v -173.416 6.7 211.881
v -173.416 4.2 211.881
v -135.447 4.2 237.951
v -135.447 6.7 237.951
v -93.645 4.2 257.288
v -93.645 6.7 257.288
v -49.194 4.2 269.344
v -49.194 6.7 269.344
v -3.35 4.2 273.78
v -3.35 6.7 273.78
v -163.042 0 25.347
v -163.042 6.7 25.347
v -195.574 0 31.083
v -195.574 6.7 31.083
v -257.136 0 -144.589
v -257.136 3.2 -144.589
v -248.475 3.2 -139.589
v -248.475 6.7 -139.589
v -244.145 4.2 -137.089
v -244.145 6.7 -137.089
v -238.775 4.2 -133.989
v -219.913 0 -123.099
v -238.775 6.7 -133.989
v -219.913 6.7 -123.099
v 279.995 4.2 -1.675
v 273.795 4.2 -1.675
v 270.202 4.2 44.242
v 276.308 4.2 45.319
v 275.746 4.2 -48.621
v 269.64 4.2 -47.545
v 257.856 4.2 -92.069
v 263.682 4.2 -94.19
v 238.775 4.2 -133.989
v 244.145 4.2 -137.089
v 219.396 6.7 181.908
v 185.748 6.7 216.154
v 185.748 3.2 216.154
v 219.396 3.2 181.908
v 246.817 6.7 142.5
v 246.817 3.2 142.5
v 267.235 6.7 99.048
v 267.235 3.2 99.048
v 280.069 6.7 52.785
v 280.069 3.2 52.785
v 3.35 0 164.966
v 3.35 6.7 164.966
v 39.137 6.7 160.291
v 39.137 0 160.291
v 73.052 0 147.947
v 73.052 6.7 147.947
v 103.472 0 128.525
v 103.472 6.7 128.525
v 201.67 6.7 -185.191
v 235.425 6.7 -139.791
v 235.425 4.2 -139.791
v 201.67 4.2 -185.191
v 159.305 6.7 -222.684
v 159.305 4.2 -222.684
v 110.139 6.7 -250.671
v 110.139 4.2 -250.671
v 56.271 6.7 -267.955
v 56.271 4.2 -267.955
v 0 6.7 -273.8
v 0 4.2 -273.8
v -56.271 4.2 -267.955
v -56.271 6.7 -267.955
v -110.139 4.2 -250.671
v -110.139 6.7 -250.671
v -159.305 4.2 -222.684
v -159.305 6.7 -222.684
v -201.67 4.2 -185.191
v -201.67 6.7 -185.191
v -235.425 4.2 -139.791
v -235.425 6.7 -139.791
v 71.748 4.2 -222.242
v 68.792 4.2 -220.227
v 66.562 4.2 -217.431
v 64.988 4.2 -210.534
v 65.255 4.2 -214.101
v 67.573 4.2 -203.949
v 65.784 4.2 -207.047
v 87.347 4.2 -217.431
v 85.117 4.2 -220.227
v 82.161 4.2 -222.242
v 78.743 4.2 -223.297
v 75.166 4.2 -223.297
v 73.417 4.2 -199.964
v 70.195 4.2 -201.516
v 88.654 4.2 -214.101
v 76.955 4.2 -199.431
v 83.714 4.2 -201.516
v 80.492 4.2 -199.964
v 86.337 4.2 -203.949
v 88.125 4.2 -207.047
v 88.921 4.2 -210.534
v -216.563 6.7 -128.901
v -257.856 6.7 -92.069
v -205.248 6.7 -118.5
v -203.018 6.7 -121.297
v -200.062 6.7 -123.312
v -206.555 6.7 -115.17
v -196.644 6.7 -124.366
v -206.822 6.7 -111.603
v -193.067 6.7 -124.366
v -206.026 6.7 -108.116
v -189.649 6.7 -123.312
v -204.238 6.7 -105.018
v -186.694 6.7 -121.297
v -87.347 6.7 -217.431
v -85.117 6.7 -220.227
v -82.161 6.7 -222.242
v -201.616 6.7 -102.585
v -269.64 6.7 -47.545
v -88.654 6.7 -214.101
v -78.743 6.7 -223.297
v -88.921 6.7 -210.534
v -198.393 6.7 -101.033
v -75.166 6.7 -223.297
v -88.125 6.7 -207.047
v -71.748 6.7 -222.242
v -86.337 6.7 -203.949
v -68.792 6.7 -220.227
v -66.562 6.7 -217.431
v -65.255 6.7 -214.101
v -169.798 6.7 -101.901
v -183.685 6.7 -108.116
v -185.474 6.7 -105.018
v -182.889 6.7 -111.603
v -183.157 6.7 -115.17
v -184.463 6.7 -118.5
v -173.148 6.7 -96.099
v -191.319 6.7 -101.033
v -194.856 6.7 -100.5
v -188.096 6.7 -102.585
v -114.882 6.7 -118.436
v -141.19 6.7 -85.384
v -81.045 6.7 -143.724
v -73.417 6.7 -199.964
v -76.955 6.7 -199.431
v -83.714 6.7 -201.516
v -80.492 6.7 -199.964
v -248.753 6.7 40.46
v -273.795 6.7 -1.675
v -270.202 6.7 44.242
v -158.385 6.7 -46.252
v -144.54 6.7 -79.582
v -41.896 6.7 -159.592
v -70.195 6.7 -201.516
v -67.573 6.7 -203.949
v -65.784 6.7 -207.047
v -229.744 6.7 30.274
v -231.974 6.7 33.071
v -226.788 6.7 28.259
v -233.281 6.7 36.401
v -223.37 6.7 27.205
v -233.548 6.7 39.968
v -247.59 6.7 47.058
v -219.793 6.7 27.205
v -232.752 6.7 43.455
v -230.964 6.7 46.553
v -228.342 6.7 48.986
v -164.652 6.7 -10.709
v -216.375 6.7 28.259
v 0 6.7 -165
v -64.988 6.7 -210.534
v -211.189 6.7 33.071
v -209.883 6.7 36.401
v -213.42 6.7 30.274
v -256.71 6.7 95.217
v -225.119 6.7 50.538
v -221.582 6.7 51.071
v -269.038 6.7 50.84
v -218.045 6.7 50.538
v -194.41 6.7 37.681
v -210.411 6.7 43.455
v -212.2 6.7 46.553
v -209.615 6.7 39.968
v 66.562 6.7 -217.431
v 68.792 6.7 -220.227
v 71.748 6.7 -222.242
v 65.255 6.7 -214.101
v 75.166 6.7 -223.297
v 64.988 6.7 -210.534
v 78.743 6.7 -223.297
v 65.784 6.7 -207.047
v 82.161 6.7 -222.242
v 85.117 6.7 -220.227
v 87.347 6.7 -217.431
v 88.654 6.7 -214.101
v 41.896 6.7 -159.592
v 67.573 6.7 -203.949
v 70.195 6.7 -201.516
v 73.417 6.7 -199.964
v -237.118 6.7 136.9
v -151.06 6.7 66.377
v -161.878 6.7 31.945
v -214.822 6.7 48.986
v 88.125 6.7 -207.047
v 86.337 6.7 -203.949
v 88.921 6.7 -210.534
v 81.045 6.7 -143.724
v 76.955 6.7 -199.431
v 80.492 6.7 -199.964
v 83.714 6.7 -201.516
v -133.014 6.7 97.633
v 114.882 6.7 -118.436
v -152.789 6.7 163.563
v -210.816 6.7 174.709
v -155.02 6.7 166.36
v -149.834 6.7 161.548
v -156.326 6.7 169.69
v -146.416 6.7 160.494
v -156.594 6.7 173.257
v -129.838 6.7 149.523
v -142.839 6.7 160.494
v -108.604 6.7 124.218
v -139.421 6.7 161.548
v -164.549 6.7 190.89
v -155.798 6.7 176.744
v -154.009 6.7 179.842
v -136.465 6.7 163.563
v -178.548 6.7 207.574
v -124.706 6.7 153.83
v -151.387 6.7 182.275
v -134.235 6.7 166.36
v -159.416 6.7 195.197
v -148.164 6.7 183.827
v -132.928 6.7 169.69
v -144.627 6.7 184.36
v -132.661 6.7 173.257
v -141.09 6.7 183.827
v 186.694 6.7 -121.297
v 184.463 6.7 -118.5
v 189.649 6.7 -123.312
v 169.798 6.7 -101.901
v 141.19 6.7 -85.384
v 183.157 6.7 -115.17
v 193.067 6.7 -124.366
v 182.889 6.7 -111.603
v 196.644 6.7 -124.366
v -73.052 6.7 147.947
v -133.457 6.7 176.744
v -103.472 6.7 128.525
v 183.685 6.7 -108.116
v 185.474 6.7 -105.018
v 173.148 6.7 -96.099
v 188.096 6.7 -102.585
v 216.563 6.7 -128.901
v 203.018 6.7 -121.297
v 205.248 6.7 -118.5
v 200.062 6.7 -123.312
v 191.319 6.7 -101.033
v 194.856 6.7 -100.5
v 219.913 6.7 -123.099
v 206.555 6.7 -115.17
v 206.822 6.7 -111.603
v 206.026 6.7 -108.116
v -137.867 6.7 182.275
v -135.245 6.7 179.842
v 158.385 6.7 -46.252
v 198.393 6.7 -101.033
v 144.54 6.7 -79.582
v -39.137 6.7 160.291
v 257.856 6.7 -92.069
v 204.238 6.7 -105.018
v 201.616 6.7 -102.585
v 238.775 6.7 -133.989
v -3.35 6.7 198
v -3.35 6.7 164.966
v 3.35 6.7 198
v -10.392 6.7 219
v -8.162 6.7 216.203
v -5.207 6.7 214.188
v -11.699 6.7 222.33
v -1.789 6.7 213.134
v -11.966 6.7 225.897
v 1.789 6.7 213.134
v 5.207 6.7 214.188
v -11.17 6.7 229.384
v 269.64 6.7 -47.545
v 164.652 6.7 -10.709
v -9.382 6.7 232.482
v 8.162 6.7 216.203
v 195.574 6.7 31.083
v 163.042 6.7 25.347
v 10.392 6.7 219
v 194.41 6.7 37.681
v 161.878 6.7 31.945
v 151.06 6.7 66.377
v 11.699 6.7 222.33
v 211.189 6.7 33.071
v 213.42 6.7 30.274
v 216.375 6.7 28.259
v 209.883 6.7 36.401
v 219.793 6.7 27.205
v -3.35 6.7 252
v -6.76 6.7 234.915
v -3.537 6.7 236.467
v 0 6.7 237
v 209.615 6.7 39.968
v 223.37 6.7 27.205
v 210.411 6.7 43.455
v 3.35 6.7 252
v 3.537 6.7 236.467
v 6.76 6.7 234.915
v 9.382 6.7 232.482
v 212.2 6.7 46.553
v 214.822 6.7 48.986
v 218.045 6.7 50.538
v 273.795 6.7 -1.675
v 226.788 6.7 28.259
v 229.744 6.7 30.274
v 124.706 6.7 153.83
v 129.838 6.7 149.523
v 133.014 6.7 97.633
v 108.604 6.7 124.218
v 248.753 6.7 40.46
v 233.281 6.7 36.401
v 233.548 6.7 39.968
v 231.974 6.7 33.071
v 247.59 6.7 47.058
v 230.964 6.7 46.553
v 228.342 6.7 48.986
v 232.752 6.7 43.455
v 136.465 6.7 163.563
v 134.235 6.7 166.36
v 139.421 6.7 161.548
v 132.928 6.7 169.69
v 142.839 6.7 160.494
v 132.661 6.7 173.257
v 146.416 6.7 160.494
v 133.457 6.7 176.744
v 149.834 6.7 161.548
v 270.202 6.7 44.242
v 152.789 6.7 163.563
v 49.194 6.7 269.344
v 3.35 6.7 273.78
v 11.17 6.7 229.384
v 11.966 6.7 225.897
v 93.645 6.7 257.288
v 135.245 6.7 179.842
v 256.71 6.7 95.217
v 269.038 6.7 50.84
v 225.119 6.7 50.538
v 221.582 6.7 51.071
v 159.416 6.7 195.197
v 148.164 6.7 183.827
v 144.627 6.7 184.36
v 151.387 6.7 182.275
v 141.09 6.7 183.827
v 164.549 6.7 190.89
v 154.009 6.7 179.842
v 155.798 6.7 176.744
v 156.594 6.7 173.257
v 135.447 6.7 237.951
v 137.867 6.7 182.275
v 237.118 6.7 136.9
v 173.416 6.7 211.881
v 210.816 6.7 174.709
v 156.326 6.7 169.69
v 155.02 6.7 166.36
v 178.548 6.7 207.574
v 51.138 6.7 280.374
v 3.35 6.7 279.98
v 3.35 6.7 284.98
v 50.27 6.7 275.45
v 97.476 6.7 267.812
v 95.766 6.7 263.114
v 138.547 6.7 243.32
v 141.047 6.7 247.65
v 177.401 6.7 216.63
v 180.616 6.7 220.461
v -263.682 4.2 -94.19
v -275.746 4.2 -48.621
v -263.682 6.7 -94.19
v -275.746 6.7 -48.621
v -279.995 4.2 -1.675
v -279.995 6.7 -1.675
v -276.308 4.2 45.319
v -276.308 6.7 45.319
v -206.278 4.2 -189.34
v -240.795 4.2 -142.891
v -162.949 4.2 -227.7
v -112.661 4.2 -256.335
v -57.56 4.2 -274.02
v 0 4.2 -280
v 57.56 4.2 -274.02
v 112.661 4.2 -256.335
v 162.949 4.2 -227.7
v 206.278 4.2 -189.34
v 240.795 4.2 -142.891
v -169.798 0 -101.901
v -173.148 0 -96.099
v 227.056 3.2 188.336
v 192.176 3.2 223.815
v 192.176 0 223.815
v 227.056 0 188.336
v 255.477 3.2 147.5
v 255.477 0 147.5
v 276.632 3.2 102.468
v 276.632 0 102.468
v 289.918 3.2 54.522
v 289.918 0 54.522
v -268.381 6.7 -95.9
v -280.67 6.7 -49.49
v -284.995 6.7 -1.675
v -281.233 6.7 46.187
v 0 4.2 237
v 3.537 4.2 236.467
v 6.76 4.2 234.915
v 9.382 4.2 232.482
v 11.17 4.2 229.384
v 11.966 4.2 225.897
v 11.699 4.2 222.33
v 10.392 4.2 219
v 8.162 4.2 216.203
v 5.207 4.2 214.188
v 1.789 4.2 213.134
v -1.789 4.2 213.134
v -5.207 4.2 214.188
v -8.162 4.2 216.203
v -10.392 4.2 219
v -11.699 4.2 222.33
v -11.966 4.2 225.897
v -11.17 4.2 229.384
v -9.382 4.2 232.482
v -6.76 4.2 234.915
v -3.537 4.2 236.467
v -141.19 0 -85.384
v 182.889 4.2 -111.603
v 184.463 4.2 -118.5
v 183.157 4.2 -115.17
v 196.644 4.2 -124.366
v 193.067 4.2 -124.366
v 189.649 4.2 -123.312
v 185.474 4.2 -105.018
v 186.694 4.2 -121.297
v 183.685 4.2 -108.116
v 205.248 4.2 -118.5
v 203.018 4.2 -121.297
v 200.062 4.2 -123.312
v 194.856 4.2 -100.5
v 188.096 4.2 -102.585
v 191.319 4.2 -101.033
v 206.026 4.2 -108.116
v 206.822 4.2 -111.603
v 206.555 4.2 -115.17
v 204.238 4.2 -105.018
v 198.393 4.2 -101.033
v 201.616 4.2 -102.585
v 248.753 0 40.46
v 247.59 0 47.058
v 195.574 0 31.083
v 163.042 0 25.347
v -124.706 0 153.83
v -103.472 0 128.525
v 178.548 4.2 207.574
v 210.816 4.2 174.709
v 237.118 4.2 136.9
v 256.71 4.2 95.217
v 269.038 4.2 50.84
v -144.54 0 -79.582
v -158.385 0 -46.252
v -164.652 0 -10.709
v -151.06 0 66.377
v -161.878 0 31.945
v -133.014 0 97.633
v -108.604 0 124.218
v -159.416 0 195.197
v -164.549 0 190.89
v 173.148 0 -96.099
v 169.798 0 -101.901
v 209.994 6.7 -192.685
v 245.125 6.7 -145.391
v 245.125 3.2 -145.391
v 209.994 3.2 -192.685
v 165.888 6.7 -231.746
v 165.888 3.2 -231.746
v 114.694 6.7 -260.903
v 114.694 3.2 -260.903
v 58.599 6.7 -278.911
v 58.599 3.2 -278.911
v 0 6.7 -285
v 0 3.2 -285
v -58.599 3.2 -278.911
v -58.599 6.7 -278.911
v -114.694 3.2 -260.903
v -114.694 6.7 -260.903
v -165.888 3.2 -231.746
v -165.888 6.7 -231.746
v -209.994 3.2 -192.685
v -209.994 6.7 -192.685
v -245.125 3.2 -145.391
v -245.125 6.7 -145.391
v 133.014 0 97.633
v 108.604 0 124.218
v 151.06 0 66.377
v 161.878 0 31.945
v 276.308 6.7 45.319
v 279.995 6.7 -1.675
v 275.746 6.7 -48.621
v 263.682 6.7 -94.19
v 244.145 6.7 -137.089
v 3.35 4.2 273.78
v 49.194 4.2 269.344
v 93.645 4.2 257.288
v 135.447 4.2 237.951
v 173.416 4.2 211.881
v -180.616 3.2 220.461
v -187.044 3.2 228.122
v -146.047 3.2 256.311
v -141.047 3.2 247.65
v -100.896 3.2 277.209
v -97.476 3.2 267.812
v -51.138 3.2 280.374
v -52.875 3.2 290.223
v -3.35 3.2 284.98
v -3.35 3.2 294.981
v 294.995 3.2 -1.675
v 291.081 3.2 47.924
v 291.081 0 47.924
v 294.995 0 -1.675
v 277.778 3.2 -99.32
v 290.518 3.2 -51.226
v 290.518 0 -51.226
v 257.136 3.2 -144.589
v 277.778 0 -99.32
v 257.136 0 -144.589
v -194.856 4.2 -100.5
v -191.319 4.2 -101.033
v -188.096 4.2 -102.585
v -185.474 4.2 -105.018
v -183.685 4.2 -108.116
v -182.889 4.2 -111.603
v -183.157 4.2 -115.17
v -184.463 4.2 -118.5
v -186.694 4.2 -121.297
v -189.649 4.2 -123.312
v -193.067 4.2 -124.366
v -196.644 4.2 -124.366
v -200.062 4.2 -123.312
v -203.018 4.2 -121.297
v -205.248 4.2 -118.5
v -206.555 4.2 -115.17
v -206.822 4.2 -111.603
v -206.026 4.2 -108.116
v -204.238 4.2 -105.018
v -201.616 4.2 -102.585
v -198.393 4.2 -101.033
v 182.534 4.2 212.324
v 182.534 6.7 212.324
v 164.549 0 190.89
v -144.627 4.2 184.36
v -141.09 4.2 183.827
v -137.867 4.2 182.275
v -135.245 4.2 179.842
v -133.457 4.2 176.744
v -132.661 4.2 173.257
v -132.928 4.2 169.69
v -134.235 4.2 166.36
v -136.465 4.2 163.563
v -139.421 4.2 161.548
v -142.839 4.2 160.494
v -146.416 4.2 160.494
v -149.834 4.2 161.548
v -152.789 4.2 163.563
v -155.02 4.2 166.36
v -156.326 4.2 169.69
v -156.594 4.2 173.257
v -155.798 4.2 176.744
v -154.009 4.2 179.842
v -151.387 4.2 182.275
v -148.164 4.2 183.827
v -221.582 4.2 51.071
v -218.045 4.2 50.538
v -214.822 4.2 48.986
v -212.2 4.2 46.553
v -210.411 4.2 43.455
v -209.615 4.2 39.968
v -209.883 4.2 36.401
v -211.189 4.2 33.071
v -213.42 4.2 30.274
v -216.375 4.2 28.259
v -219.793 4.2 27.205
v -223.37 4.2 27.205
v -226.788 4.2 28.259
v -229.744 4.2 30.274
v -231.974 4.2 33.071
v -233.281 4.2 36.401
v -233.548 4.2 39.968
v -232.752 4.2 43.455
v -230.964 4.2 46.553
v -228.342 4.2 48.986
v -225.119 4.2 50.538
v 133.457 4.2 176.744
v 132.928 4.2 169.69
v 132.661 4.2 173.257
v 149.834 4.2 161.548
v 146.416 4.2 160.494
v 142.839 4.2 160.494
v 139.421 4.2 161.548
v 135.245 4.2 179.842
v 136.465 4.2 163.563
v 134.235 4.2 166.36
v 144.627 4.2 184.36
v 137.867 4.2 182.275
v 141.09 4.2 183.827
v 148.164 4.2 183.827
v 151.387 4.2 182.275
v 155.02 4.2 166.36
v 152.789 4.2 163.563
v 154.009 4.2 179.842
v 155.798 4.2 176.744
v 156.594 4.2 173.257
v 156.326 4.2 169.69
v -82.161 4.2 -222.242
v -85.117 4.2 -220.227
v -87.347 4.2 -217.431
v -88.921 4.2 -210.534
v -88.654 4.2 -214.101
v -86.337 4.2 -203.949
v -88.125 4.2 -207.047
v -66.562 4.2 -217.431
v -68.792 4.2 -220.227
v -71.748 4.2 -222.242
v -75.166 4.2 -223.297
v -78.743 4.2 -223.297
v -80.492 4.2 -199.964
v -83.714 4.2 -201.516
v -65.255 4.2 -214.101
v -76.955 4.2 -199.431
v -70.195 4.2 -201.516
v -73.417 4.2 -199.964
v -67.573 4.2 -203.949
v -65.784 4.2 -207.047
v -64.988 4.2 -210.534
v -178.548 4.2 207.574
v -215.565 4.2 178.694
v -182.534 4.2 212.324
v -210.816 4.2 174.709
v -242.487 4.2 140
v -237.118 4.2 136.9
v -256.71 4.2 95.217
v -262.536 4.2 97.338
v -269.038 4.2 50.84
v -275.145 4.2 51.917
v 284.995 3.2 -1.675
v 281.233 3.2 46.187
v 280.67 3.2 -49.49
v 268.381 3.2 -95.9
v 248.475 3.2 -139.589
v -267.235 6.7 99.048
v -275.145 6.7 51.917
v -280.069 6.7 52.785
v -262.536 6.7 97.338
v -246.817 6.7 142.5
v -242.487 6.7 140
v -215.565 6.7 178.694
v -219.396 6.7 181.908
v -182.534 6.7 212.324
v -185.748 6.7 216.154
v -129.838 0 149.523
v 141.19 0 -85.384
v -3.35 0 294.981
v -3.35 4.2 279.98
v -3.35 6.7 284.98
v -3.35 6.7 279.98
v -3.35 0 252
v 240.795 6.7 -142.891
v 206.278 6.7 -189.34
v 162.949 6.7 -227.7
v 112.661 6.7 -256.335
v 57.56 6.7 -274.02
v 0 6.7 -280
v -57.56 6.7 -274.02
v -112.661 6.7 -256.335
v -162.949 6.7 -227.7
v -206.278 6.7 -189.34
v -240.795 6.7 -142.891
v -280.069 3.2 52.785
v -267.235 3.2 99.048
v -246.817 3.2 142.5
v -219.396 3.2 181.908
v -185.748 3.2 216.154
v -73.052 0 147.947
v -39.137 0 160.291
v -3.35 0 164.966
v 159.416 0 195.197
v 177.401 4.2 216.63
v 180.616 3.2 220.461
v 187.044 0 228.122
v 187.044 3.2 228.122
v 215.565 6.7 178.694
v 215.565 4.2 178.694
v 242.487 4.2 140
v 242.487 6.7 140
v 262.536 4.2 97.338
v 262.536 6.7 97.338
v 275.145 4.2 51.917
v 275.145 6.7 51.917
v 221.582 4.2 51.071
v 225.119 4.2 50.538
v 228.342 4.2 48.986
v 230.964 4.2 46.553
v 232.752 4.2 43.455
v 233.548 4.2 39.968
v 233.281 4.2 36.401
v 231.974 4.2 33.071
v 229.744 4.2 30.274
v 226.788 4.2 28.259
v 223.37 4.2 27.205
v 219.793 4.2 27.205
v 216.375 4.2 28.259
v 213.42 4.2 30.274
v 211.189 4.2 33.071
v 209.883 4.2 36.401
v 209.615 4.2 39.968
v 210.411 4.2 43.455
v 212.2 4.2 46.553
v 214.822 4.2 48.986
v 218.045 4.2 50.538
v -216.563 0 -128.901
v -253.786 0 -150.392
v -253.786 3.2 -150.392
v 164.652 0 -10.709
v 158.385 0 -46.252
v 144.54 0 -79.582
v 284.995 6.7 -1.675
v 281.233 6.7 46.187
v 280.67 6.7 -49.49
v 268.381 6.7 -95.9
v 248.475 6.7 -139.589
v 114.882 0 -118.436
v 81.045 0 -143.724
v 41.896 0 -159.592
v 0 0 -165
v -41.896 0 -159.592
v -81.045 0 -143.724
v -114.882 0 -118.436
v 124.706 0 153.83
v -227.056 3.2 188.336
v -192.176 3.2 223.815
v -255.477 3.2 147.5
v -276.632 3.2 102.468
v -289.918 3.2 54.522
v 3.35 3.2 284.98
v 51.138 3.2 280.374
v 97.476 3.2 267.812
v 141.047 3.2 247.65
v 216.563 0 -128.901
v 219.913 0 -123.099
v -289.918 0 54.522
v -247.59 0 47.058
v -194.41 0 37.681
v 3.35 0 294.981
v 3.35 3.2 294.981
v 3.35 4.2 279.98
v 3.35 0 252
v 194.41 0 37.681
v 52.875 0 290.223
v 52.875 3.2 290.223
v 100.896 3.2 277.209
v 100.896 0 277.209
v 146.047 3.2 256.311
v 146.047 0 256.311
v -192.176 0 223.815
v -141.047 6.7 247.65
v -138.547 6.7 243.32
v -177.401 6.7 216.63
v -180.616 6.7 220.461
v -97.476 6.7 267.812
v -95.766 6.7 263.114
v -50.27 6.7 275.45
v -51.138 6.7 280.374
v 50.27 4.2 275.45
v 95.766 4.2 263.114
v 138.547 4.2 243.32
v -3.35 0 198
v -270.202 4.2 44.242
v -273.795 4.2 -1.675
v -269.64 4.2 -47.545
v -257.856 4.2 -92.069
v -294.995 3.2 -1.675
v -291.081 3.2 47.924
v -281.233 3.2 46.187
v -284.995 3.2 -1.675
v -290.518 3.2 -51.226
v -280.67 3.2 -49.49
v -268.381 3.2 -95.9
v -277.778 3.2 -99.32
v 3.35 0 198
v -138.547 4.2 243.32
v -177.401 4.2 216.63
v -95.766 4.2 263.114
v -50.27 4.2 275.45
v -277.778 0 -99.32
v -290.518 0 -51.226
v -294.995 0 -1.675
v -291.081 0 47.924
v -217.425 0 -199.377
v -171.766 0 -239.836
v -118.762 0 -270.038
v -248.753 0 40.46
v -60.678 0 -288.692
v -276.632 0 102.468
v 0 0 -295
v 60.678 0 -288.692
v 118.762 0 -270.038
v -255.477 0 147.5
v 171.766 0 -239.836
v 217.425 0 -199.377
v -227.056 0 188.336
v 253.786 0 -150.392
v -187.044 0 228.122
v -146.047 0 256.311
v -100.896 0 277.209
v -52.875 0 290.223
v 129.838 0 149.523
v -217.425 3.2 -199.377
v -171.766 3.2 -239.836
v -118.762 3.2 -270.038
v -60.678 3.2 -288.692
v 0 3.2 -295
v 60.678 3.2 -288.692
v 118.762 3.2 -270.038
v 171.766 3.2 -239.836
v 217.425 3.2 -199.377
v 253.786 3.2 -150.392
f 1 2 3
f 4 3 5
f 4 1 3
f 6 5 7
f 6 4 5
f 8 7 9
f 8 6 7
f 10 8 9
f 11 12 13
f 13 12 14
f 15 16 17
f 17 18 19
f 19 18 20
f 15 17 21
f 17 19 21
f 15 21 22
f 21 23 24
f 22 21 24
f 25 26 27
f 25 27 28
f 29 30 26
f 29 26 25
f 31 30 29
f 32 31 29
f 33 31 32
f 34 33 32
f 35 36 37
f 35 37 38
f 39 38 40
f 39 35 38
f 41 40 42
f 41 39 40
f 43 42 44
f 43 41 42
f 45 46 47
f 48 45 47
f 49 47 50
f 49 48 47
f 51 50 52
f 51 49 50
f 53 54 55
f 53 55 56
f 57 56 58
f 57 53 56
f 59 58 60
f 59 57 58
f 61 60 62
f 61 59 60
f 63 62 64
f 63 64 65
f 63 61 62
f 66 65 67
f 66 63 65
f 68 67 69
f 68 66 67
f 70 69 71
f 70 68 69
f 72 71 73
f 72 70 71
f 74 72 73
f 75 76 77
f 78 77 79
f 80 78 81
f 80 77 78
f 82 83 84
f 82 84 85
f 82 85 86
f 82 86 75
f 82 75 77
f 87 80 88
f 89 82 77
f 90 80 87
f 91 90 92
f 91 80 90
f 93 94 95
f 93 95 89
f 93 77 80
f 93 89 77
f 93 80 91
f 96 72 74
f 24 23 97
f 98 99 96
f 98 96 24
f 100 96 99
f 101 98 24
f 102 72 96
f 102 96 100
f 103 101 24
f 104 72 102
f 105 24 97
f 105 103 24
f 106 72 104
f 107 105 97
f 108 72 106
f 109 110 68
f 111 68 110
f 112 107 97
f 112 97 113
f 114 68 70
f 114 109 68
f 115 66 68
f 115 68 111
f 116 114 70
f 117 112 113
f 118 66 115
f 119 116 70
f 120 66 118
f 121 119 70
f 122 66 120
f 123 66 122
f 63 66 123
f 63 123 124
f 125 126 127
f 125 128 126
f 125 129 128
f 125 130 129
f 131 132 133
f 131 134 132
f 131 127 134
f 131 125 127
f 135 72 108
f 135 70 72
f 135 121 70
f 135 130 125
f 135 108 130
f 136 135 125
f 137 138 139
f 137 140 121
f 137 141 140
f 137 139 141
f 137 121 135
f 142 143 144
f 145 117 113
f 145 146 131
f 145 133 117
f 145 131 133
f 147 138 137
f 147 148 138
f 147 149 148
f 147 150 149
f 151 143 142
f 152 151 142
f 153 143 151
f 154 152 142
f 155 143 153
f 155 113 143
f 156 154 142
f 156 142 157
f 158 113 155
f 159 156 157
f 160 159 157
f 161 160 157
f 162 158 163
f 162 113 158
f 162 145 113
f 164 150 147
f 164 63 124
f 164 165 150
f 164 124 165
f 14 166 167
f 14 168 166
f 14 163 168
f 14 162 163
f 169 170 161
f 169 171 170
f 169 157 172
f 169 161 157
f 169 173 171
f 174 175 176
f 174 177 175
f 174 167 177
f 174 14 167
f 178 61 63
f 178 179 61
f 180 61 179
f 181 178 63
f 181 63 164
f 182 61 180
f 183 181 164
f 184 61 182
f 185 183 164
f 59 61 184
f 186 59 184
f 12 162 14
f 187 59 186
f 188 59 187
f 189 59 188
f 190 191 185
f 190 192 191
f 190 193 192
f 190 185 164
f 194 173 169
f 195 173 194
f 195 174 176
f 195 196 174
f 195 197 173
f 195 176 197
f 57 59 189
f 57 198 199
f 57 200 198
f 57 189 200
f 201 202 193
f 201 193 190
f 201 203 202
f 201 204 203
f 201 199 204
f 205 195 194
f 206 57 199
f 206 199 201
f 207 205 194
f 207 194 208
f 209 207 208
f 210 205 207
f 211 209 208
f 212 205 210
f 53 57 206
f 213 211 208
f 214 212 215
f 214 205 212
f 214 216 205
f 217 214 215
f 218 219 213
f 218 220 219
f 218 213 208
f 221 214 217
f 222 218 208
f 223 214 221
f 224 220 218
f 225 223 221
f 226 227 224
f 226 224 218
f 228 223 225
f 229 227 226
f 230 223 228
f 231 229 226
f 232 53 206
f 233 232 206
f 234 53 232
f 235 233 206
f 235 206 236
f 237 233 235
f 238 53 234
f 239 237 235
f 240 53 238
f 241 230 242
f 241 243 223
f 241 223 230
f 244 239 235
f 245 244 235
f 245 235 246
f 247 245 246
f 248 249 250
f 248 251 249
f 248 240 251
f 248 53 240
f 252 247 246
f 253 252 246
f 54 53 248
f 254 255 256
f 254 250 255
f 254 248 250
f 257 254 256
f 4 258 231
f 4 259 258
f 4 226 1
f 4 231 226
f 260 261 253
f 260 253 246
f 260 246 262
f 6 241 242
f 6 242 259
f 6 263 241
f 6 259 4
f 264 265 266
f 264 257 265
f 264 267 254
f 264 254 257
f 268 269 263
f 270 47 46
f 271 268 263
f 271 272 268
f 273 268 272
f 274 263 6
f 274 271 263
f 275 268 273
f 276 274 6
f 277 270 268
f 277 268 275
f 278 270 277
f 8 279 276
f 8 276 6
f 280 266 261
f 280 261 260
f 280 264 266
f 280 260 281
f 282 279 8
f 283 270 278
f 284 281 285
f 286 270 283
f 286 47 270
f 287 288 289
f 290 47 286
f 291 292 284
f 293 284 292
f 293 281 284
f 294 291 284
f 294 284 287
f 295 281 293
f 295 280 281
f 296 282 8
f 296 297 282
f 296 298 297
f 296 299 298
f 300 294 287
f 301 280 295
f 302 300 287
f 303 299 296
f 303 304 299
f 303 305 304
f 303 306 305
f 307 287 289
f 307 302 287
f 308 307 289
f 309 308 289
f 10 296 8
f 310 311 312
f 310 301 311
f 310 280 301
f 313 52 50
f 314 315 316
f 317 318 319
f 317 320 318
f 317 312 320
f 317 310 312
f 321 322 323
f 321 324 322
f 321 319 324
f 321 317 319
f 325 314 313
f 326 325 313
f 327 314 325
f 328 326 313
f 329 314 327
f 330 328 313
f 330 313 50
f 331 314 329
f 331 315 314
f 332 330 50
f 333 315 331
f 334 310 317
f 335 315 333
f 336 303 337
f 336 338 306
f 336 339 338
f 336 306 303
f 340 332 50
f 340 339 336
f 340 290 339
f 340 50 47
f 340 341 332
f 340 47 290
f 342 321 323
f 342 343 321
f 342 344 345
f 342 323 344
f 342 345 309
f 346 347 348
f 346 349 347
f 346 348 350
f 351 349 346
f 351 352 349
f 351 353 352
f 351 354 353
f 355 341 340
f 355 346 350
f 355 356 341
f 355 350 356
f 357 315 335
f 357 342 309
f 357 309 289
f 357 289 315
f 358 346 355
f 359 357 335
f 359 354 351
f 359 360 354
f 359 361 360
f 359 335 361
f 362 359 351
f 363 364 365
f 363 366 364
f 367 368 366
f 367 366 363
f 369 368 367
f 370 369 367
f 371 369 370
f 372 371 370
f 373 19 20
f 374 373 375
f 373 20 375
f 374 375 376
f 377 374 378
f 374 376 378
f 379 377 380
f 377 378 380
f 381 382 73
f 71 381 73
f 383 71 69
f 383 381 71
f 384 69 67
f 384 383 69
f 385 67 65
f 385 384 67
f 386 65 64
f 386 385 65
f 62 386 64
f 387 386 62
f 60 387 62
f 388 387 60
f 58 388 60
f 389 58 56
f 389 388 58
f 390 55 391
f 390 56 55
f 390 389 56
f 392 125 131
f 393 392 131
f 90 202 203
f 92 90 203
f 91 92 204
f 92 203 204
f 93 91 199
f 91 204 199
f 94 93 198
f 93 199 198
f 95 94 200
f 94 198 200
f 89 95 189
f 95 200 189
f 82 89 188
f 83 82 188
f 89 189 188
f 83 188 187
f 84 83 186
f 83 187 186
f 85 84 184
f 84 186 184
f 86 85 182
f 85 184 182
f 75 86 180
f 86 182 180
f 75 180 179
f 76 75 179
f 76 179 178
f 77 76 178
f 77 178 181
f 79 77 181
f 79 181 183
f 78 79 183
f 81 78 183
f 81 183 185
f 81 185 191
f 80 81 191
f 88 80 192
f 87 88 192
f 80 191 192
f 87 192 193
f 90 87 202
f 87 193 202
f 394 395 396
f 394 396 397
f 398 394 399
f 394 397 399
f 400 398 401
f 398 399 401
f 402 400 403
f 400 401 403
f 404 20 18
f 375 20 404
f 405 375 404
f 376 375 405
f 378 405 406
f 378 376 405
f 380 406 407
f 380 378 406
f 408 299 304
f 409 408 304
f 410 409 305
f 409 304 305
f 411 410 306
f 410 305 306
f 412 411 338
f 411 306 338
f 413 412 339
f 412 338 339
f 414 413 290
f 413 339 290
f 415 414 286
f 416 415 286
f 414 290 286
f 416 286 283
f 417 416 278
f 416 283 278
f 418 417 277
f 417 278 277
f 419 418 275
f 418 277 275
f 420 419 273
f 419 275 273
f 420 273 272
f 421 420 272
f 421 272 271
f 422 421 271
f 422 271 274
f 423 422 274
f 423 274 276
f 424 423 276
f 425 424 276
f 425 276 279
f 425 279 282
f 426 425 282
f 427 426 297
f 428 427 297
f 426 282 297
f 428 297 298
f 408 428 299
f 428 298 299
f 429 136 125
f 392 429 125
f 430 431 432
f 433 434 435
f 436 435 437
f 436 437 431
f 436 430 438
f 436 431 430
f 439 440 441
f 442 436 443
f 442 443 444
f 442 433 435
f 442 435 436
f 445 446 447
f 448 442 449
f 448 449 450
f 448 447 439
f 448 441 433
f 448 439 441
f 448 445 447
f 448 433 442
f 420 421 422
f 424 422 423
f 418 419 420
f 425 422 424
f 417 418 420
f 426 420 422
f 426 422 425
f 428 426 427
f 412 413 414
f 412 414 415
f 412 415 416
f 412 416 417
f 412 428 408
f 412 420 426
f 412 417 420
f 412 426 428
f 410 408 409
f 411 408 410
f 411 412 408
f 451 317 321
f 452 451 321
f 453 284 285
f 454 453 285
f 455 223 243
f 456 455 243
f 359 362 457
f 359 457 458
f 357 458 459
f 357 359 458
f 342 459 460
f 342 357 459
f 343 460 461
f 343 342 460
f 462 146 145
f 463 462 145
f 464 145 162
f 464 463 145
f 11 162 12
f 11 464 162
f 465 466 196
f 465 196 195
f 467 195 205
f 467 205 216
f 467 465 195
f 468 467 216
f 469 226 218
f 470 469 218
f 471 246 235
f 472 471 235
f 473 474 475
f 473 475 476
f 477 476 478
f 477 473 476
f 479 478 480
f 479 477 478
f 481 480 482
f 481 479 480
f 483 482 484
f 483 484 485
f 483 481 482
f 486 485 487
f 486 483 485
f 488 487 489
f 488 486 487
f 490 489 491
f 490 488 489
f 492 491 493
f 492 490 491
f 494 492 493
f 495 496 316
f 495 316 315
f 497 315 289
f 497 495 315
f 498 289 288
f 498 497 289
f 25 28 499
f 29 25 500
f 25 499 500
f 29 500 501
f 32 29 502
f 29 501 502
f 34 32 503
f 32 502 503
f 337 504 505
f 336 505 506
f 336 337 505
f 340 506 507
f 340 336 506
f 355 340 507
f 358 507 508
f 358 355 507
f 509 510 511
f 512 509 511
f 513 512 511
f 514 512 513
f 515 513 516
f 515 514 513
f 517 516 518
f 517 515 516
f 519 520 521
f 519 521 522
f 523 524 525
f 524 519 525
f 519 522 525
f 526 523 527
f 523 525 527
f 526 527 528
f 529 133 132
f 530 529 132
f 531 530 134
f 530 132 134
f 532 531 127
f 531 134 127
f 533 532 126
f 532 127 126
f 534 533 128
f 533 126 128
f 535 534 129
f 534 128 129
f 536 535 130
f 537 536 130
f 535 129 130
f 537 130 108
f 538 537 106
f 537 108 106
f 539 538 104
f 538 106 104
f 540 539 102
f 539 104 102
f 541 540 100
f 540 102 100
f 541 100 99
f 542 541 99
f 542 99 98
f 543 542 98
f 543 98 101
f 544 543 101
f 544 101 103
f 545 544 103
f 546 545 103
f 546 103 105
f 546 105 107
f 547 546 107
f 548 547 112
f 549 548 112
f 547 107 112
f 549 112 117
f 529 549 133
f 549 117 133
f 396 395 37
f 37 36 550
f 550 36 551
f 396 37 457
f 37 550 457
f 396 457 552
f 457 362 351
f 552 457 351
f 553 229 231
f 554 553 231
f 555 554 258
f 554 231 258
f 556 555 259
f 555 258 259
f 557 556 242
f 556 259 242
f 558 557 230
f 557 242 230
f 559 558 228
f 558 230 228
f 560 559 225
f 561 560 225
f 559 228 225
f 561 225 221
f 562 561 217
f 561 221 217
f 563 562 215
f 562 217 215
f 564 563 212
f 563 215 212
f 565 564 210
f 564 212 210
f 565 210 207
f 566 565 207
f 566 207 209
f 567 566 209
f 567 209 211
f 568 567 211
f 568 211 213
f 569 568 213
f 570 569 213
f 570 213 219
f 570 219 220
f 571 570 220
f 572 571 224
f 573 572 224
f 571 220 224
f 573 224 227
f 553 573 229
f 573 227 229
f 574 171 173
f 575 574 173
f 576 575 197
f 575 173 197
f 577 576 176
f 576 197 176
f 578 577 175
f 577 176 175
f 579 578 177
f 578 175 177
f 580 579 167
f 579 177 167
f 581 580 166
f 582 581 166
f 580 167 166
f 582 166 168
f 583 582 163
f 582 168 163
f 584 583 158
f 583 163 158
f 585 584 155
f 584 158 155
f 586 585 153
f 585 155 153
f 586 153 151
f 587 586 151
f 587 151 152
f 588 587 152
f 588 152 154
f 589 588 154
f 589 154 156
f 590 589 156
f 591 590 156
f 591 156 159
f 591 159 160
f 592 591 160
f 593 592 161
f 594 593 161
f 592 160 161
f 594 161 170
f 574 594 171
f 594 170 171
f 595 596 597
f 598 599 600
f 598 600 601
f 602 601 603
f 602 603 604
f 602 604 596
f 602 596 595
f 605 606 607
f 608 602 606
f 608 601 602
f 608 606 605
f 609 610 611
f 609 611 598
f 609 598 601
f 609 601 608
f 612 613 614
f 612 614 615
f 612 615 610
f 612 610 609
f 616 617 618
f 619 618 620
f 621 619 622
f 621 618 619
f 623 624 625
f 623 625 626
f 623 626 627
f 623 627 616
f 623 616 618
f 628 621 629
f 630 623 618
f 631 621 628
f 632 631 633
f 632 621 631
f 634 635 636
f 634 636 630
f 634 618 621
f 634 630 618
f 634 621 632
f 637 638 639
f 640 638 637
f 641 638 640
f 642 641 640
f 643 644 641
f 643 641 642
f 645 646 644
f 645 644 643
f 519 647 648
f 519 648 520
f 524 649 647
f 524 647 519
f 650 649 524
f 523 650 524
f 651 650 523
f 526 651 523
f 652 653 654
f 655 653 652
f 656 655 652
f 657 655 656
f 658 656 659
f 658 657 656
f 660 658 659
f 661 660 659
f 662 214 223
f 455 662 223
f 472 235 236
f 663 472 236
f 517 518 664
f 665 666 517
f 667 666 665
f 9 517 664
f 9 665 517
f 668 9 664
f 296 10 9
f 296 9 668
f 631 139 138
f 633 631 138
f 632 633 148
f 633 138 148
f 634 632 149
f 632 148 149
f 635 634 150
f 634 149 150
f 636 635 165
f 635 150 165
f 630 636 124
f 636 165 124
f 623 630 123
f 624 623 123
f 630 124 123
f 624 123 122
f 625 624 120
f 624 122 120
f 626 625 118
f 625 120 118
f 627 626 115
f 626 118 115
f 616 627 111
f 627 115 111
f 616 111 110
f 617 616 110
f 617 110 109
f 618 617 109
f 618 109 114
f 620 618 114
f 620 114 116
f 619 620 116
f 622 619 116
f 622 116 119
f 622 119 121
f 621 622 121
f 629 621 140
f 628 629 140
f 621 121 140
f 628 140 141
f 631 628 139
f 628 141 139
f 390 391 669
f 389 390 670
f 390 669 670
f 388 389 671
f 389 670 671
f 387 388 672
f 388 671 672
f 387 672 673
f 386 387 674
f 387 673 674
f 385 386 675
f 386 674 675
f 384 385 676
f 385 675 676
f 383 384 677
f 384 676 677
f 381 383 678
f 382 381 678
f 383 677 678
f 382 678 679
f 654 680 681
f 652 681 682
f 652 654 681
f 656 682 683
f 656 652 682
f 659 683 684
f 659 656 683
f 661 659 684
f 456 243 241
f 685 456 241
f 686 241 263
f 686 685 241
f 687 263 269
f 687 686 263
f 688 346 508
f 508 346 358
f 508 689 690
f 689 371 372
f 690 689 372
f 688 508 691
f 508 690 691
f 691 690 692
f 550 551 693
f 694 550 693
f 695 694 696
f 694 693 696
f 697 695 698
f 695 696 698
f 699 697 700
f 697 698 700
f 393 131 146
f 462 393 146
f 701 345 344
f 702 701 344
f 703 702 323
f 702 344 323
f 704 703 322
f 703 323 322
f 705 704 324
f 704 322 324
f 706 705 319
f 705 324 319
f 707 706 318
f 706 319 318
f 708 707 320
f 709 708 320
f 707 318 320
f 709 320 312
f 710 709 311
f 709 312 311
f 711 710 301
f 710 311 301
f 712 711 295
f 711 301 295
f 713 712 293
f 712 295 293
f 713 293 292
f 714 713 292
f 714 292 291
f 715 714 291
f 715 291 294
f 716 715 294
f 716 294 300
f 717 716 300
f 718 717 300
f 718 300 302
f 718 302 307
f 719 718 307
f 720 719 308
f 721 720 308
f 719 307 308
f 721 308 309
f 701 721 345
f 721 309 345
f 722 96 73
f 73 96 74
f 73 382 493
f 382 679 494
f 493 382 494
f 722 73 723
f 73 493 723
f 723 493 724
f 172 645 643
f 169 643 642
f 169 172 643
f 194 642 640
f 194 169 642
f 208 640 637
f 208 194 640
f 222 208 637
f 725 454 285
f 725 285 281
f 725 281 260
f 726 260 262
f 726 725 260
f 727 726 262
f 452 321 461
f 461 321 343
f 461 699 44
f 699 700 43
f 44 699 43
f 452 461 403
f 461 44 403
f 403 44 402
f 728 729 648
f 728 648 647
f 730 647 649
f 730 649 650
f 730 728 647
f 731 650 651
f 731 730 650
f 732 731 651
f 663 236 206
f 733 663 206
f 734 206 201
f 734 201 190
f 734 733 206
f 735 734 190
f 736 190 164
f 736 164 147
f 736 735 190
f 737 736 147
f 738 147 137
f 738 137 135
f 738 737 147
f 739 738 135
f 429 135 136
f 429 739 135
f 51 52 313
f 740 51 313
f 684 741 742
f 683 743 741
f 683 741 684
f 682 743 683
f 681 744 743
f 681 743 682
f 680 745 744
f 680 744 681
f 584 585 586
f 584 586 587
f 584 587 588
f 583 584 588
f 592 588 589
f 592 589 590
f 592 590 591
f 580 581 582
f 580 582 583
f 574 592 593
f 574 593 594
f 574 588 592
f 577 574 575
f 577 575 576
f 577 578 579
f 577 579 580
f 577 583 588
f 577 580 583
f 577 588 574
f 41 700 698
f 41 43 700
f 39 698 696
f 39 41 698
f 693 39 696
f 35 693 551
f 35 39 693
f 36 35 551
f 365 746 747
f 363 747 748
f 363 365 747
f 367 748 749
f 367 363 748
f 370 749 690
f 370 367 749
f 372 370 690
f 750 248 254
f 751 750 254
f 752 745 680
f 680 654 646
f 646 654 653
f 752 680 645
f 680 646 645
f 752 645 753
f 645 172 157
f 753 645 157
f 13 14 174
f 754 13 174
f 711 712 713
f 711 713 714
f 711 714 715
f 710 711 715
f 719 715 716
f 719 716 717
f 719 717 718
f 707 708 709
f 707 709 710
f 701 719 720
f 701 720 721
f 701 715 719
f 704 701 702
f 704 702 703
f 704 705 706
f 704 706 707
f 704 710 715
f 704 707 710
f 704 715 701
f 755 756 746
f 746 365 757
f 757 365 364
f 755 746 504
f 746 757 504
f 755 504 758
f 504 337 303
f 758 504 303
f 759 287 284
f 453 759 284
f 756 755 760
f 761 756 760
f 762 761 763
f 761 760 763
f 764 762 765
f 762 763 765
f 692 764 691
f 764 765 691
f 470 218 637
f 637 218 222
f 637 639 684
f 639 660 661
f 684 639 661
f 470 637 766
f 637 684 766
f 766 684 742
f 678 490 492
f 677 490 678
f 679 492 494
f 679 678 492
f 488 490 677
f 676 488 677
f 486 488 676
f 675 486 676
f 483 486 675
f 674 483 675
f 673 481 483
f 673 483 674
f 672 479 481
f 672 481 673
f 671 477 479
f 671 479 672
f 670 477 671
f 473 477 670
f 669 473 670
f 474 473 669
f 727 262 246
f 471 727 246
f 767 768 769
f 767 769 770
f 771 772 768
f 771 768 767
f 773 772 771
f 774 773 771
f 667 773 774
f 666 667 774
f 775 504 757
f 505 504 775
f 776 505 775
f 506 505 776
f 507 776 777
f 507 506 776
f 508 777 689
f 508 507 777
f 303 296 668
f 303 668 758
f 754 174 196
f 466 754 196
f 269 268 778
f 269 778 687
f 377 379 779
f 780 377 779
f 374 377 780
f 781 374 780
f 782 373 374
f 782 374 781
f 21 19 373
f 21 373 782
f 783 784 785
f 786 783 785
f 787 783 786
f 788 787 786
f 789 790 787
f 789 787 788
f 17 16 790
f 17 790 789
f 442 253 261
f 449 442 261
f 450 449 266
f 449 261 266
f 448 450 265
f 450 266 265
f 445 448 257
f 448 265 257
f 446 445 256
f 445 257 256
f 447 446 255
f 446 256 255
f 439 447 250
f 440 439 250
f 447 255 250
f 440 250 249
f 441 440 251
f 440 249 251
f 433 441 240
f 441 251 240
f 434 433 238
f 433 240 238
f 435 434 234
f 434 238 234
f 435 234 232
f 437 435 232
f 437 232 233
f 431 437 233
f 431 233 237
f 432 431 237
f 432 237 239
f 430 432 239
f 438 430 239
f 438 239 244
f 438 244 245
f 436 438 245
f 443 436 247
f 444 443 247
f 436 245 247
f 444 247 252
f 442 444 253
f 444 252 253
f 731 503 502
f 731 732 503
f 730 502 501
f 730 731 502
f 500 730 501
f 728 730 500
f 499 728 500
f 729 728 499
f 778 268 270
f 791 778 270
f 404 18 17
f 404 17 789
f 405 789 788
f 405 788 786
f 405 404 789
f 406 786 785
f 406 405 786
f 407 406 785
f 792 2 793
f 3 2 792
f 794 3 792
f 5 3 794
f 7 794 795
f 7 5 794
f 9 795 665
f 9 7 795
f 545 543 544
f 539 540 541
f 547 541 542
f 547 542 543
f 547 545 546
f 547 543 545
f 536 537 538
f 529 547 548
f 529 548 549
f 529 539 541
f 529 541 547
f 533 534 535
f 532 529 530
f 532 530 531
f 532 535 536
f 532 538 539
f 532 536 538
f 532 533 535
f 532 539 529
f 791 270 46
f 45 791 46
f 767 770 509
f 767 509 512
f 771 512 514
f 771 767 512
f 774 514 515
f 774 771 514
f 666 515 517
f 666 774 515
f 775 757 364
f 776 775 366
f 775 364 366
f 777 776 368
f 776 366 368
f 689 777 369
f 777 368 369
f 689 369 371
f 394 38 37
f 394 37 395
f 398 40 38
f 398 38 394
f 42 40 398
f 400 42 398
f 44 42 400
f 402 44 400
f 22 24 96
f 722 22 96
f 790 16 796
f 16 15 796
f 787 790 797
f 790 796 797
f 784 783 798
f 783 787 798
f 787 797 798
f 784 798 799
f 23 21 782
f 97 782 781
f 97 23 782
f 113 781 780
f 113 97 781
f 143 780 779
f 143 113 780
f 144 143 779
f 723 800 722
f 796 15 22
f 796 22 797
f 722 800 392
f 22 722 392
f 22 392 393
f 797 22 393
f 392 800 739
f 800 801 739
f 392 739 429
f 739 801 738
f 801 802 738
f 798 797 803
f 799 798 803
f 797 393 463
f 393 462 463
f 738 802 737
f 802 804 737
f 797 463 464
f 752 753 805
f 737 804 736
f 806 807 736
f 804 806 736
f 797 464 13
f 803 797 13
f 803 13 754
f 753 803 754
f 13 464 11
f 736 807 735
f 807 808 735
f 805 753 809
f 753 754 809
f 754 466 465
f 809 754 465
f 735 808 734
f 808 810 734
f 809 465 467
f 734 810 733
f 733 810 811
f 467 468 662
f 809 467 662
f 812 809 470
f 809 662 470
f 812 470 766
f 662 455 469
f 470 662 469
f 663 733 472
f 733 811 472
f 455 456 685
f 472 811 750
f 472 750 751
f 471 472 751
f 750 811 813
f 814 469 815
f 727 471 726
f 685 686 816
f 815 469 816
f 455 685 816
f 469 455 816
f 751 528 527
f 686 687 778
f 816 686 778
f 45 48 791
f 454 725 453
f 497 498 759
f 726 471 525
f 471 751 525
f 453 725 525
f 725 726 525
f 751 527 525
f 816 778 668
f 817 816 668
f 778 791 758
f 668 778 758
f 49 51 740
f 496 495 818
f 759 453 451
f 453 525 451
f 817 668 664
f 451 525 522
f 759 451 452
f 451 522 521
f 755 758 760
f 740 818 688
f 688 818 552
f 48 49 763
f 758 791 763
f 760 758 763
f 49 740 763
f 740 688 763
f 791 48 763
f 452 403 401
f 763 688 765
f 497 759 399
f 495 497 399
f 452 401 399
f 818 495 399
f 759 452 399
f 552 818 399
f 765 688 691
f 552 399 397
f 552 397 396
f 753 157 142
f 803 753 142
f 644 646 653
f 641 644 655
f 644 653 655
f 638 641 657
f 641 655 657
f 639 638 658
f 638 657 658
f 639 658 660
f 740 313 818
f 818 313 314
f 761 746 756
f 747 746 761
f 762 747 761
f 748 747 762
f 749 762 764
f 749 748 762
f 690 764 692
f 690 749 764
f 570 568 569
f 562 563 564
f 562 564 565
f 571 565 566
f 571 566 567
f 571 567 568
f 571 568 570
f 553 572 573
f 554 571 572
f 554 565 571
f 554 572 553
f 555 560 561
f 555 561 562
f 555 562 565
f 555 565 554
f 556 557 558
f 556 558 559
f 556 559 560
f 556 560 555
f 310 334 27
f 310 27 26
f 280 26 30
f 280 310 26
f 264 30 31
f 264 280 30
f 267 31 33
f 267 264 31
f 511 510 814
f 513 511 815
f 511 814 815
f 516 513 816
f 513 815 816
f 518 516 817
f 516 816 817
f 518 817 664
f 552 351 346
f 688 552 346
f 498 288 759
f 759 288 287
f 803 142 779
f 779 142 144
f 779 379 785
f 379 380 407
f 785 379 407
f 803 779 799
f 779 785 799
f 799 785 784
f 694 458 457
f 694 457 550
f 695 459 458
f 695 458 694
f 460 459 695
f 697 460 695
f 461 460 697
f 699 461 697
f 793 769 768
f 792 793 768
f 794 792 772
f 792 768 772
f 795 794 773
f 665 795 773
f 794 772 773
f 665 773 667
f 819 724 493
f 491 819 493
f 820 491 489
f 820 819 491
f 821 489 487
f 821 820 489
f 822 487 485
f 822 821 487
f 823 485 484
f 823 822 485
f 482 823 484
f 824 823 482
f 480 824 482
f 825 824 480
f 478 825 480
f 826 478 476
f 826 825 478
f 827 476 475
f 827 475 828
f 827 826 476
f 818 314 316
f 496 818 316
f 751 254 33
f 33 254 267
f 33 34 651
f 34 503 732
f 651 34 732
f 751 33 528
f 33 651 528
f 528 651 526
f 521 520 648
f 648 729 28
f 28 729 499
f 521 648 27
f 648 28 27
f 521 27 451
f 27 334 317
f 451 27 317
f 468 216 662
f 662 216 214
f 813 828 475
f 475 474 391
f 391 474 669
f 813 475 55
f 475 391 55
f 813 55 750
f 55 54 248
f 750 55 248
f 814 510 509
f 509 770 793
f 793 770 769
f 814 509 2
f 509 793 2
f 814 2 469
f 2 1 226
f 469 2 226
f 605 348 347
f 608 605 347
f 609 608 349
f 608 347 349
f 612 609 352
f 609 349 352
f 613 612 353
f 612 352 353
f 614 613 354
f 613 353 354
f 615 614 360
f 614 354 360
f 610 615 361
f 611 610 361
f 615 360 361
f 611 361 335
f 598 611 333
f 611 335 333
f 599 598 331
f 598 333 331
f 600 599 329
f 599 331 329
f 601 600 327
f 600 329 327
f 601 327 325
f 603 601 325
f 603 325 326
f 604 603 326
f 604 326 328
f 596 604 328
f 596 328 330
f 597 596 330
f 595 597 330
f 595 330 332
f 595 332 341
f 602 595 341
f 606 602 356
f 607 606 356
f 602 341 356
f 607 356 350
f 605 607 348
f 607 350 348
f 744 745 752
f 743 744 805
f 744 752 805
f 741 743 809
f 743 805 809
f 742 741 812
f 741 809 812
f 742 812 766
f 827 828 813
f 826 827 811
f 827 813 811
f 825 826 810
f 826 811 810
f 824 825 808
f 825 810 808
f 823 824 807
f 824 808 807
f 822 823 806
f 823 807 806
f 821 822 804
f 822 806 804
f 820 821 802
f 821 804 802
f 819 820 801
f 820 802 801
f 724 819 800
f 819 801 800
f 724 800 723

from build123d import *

# Parameters (mm, degrees)
SKETCH1_R           = 295
SKETCH1_R_2         = 165
BOSS_EXTRUDE1_DEPTH = 6.7
SKETCH2_W           = 6.7
SKETCH2_H           = 34
SKETCH2_H_2         = 44
CUT_EXTRUDE3_DEPTH  = 6.7
SKETCH3_R           = 280
SKETCH3_R_2         = 273.8
SKETCH3_R_3         = 12
CUT_EXTRUDE4_DEPTH  = 2.5
SKETCH5_R           = 296
SKETCH5_R_2         = 285
CUT_EXTRUDE5_DEPTH  = 3.5


with BuildPart() as part:
    # Sketch1 → Boss-Extrude1 (new body)
    with BuildSketch(Plane(origin=(0, 0, 0), x_dir=(1, 0, 0), z_dir=(0, 1, 0))):
        with Locations(Location((0, 0, 0), (0, 0, 270))):
            Circle(SKETCH1_R)
        with Locations(Location((0, 0, 0), (0, 0, 270))):
            Circle(SKETCH1_R_2, mode=Mode.SUBTRACT)
    extrude(amount=BOSS_EXTRUDE1_DEPTH)

    # Sketch2 → Cut-Extrude3 (cut)
    with BuildSketch(Plane(origin=(0, 6.7, 0), x_dir=(1, 0, 0), z_dir=(0, 1, 0))):
        Polygon((254.66851952, 150.901185103), (216.563401754, 128.901185103), (219.913401754, 123.098814897), (258.01851952, 145.098814897), align=None)
        Polygon((169.798029949, 101.901185103), (140.353166221, 84.901185103), (143.703166221, 79.098814897), (173.148029949, 96.098814897), align=None)
        Polygon((129.838195602, -149.523461245), (107.983416873, -123.477950179), (102.850919104, -127.784627164), (124.705697833, -153.83013823), align=None)
        Polygon((290.921373496, -54.698966562), (292.084816287, -48.100754617), (248.753275154, -40.460234799), (247.589832364, -47.058446745), align=None)
        Polygon((195.573656492, -31.083233205), (162.090192889, -25.179195165), (160.926750099, -31.77740711), (194.410213701, -37.681445151), align=None)
        Polygon((187.698883583, -228.902493656), (192.831381352, -224.595816671), (164.548726525, -190.889861174), (159.416228757, -195.196538158), align=None)
        with Locations((0, -181)):
            Rectangle(SKETCH2_W, SKETCH2_H)
        with Locations((0, -274)):
            Rectangle(SKETCH2_W, SKETCH2_H_2)
        Polygon((-124.705697833, -153.83013823), (-102.850919104, -127.784627164), (-107.983416873, -123.477950179), (-129.838195602, -149.523461245), align=None)
        Polygon((-192.831381352, -224.595816671), (-187.698883583, -228.902493656), (-159.416228757, -195.196538158), (-164.548726525, -190.889861174), align=None)
        Polygon((-194.410213701, -37.681445151), (-160.926750099, -31.77740711), (-162.090192889, -25.179195165), (-195.573656492, -31.083233205), align=None)
        Polygon((-292.084816287, -48.100754617), (-290.921373496, -54.698966562), (-247.589832364, -47.058446745), (-248.753275154, -40.460234799), align=None)
        Polygon((-254.66851952, 150.901185103), (-258.01851952, 145.098814897), (-219.913401754, 123.098814897), (-216.563401754, 128.901185103), align=None)
        Polygon((-173.148029949, 96.098814897), (-143.703166221, 79.098814897), (-140.353166221, 84.901185103), (-169.798029949, 101.901185103), align=None)
    extrude(amount=-CUT_EXTRUDE3_DEPTH, mode=Mode.SUBTRACT)

    # Sketch3 → Cut-Extrude4 (cut)
    # profile 1 of 10: a face of its own
    with BuildSketch(Plane(origin=(0, 6.7, 0), x_dir=(1, 0, 0), z_dir=(0, 1, 0))):
        Circle(SKETCH3_R)
        Circle(SKETCH3_R_2, mode=Mode.SUBTRACT)
    # profile 2 of 10: a face of its own
    with BuildSketch(Plane(origin=(0, 6.7, 0), x_dir=(1, 0, 0), z_dir=(0, 1, 0))):
        with Locations(Location((0, -225, 0), (0, 0, 270))):
            Circle(SKETCH3_R_3)
    # profile 3 of 10: a face of its own
    with BuildSketch(Plane(origin=(0, 6.7, 0), x_dir=(1, 0, 0), z_dir=(0, 1, 0))):
        with Locations(Location((-144.627212179, -172.359999702, 0), (0, 0, 270))):
            Circle(SKETCH3_R_3)
    # profile 4 of 10: a face of its own
    with BuildSketch(Plane(origin=(0, 6.7, 0), x_dir=(1, 0, 0), z_dir=(0, 1, 0))):
        with Locations(Location((-221.581744428, -39.070839975, 0), (0, 0, 270))):
            Circle(SKETCH3_R_3)
    # profile 5 of 10: a face of its own
    with BuildSketch(Plane(origin=(0, 6.7, 0), x_dir=(1, 0, 0), z_dir=(0, 1, 0))):
        with Locations(Location((-194.855715851, 112.5, 0), (0, 0, 270))):
            Circle(SKETCH3_R_3)
    # profile 6 of 10: a face of its own
    with BuildSketch(Plane(origin=(0, 6.7, 0), x_dir=(1, 0, 0), z_dir=(0, 1, 0))):
        with Locations(Location((-76.954532248, 211.430839677, 0), (0, 0, 270))):
            Circle(SKETCH3_R_3)
    # profile 7 of 10: a face of its own
    with BuildSketch(Plane(origin=(0, 6.7, 0), x_dir=(1, 0, 0), z_dir=(0, 1, 0))):
        with Locations(Location((76.954532248, 211.430839677, 0), (0, 0, 270))):
            Circle(SKETCH3_R_3)
    # profile 8 of 10: a face of its own
    with BuildSketch(Plane(origin=(0, 6.7, 0), x_dir=(1, 0, 0), z_dir=(0, 1, 0))):
        with Locations(Location((194.855715851, 112.5, 0), (0, 0, 270))):
            Circle(SKETCH3_R_3)
    # profile 9 of 10: a face of its own
    with BuildSketch(Plane(origin=(0, 6.7, 0), x_dir=(1, 0, 0), z_dir=(0, 1, 0))):
        with Locations(Location((221.581744428, -39.070839975, 0), (0, 0, 270))):
            Circle(SKETCH3_R_3)
    # profile 10 of 10: a face of its own
    with BuildSketch(Plane(origin=(0, 6.7, 0), x_dir=(1, 0, 0), z_dir=(0, 1, 0))):
        with Locations(Location((144.627212179, -172.359999702, 0), (0, 0, 270))):
            Circle(SKETCH3_R_3)
    extrude(amount=-CUT_EXTRUDE4_DEPTH, mode=Mode.SUBTRACT)

    # Sketch5 → Cut-Extrude5 (cut)
    with BuildSketch(Plane(origin=(0, 6.7, 0), x_dir=(1, 0, 0), z_dir=(0, 1, 0))):
        Circle(SKETCH5_R)
        Circle(SKETCH5_R_2, mode=Mode.SUBTRACT)
    extrude(amount=-CUT_EXTRUDE5_DEPTH, mode=Mode.SUBTRACT)


solid = part.part
